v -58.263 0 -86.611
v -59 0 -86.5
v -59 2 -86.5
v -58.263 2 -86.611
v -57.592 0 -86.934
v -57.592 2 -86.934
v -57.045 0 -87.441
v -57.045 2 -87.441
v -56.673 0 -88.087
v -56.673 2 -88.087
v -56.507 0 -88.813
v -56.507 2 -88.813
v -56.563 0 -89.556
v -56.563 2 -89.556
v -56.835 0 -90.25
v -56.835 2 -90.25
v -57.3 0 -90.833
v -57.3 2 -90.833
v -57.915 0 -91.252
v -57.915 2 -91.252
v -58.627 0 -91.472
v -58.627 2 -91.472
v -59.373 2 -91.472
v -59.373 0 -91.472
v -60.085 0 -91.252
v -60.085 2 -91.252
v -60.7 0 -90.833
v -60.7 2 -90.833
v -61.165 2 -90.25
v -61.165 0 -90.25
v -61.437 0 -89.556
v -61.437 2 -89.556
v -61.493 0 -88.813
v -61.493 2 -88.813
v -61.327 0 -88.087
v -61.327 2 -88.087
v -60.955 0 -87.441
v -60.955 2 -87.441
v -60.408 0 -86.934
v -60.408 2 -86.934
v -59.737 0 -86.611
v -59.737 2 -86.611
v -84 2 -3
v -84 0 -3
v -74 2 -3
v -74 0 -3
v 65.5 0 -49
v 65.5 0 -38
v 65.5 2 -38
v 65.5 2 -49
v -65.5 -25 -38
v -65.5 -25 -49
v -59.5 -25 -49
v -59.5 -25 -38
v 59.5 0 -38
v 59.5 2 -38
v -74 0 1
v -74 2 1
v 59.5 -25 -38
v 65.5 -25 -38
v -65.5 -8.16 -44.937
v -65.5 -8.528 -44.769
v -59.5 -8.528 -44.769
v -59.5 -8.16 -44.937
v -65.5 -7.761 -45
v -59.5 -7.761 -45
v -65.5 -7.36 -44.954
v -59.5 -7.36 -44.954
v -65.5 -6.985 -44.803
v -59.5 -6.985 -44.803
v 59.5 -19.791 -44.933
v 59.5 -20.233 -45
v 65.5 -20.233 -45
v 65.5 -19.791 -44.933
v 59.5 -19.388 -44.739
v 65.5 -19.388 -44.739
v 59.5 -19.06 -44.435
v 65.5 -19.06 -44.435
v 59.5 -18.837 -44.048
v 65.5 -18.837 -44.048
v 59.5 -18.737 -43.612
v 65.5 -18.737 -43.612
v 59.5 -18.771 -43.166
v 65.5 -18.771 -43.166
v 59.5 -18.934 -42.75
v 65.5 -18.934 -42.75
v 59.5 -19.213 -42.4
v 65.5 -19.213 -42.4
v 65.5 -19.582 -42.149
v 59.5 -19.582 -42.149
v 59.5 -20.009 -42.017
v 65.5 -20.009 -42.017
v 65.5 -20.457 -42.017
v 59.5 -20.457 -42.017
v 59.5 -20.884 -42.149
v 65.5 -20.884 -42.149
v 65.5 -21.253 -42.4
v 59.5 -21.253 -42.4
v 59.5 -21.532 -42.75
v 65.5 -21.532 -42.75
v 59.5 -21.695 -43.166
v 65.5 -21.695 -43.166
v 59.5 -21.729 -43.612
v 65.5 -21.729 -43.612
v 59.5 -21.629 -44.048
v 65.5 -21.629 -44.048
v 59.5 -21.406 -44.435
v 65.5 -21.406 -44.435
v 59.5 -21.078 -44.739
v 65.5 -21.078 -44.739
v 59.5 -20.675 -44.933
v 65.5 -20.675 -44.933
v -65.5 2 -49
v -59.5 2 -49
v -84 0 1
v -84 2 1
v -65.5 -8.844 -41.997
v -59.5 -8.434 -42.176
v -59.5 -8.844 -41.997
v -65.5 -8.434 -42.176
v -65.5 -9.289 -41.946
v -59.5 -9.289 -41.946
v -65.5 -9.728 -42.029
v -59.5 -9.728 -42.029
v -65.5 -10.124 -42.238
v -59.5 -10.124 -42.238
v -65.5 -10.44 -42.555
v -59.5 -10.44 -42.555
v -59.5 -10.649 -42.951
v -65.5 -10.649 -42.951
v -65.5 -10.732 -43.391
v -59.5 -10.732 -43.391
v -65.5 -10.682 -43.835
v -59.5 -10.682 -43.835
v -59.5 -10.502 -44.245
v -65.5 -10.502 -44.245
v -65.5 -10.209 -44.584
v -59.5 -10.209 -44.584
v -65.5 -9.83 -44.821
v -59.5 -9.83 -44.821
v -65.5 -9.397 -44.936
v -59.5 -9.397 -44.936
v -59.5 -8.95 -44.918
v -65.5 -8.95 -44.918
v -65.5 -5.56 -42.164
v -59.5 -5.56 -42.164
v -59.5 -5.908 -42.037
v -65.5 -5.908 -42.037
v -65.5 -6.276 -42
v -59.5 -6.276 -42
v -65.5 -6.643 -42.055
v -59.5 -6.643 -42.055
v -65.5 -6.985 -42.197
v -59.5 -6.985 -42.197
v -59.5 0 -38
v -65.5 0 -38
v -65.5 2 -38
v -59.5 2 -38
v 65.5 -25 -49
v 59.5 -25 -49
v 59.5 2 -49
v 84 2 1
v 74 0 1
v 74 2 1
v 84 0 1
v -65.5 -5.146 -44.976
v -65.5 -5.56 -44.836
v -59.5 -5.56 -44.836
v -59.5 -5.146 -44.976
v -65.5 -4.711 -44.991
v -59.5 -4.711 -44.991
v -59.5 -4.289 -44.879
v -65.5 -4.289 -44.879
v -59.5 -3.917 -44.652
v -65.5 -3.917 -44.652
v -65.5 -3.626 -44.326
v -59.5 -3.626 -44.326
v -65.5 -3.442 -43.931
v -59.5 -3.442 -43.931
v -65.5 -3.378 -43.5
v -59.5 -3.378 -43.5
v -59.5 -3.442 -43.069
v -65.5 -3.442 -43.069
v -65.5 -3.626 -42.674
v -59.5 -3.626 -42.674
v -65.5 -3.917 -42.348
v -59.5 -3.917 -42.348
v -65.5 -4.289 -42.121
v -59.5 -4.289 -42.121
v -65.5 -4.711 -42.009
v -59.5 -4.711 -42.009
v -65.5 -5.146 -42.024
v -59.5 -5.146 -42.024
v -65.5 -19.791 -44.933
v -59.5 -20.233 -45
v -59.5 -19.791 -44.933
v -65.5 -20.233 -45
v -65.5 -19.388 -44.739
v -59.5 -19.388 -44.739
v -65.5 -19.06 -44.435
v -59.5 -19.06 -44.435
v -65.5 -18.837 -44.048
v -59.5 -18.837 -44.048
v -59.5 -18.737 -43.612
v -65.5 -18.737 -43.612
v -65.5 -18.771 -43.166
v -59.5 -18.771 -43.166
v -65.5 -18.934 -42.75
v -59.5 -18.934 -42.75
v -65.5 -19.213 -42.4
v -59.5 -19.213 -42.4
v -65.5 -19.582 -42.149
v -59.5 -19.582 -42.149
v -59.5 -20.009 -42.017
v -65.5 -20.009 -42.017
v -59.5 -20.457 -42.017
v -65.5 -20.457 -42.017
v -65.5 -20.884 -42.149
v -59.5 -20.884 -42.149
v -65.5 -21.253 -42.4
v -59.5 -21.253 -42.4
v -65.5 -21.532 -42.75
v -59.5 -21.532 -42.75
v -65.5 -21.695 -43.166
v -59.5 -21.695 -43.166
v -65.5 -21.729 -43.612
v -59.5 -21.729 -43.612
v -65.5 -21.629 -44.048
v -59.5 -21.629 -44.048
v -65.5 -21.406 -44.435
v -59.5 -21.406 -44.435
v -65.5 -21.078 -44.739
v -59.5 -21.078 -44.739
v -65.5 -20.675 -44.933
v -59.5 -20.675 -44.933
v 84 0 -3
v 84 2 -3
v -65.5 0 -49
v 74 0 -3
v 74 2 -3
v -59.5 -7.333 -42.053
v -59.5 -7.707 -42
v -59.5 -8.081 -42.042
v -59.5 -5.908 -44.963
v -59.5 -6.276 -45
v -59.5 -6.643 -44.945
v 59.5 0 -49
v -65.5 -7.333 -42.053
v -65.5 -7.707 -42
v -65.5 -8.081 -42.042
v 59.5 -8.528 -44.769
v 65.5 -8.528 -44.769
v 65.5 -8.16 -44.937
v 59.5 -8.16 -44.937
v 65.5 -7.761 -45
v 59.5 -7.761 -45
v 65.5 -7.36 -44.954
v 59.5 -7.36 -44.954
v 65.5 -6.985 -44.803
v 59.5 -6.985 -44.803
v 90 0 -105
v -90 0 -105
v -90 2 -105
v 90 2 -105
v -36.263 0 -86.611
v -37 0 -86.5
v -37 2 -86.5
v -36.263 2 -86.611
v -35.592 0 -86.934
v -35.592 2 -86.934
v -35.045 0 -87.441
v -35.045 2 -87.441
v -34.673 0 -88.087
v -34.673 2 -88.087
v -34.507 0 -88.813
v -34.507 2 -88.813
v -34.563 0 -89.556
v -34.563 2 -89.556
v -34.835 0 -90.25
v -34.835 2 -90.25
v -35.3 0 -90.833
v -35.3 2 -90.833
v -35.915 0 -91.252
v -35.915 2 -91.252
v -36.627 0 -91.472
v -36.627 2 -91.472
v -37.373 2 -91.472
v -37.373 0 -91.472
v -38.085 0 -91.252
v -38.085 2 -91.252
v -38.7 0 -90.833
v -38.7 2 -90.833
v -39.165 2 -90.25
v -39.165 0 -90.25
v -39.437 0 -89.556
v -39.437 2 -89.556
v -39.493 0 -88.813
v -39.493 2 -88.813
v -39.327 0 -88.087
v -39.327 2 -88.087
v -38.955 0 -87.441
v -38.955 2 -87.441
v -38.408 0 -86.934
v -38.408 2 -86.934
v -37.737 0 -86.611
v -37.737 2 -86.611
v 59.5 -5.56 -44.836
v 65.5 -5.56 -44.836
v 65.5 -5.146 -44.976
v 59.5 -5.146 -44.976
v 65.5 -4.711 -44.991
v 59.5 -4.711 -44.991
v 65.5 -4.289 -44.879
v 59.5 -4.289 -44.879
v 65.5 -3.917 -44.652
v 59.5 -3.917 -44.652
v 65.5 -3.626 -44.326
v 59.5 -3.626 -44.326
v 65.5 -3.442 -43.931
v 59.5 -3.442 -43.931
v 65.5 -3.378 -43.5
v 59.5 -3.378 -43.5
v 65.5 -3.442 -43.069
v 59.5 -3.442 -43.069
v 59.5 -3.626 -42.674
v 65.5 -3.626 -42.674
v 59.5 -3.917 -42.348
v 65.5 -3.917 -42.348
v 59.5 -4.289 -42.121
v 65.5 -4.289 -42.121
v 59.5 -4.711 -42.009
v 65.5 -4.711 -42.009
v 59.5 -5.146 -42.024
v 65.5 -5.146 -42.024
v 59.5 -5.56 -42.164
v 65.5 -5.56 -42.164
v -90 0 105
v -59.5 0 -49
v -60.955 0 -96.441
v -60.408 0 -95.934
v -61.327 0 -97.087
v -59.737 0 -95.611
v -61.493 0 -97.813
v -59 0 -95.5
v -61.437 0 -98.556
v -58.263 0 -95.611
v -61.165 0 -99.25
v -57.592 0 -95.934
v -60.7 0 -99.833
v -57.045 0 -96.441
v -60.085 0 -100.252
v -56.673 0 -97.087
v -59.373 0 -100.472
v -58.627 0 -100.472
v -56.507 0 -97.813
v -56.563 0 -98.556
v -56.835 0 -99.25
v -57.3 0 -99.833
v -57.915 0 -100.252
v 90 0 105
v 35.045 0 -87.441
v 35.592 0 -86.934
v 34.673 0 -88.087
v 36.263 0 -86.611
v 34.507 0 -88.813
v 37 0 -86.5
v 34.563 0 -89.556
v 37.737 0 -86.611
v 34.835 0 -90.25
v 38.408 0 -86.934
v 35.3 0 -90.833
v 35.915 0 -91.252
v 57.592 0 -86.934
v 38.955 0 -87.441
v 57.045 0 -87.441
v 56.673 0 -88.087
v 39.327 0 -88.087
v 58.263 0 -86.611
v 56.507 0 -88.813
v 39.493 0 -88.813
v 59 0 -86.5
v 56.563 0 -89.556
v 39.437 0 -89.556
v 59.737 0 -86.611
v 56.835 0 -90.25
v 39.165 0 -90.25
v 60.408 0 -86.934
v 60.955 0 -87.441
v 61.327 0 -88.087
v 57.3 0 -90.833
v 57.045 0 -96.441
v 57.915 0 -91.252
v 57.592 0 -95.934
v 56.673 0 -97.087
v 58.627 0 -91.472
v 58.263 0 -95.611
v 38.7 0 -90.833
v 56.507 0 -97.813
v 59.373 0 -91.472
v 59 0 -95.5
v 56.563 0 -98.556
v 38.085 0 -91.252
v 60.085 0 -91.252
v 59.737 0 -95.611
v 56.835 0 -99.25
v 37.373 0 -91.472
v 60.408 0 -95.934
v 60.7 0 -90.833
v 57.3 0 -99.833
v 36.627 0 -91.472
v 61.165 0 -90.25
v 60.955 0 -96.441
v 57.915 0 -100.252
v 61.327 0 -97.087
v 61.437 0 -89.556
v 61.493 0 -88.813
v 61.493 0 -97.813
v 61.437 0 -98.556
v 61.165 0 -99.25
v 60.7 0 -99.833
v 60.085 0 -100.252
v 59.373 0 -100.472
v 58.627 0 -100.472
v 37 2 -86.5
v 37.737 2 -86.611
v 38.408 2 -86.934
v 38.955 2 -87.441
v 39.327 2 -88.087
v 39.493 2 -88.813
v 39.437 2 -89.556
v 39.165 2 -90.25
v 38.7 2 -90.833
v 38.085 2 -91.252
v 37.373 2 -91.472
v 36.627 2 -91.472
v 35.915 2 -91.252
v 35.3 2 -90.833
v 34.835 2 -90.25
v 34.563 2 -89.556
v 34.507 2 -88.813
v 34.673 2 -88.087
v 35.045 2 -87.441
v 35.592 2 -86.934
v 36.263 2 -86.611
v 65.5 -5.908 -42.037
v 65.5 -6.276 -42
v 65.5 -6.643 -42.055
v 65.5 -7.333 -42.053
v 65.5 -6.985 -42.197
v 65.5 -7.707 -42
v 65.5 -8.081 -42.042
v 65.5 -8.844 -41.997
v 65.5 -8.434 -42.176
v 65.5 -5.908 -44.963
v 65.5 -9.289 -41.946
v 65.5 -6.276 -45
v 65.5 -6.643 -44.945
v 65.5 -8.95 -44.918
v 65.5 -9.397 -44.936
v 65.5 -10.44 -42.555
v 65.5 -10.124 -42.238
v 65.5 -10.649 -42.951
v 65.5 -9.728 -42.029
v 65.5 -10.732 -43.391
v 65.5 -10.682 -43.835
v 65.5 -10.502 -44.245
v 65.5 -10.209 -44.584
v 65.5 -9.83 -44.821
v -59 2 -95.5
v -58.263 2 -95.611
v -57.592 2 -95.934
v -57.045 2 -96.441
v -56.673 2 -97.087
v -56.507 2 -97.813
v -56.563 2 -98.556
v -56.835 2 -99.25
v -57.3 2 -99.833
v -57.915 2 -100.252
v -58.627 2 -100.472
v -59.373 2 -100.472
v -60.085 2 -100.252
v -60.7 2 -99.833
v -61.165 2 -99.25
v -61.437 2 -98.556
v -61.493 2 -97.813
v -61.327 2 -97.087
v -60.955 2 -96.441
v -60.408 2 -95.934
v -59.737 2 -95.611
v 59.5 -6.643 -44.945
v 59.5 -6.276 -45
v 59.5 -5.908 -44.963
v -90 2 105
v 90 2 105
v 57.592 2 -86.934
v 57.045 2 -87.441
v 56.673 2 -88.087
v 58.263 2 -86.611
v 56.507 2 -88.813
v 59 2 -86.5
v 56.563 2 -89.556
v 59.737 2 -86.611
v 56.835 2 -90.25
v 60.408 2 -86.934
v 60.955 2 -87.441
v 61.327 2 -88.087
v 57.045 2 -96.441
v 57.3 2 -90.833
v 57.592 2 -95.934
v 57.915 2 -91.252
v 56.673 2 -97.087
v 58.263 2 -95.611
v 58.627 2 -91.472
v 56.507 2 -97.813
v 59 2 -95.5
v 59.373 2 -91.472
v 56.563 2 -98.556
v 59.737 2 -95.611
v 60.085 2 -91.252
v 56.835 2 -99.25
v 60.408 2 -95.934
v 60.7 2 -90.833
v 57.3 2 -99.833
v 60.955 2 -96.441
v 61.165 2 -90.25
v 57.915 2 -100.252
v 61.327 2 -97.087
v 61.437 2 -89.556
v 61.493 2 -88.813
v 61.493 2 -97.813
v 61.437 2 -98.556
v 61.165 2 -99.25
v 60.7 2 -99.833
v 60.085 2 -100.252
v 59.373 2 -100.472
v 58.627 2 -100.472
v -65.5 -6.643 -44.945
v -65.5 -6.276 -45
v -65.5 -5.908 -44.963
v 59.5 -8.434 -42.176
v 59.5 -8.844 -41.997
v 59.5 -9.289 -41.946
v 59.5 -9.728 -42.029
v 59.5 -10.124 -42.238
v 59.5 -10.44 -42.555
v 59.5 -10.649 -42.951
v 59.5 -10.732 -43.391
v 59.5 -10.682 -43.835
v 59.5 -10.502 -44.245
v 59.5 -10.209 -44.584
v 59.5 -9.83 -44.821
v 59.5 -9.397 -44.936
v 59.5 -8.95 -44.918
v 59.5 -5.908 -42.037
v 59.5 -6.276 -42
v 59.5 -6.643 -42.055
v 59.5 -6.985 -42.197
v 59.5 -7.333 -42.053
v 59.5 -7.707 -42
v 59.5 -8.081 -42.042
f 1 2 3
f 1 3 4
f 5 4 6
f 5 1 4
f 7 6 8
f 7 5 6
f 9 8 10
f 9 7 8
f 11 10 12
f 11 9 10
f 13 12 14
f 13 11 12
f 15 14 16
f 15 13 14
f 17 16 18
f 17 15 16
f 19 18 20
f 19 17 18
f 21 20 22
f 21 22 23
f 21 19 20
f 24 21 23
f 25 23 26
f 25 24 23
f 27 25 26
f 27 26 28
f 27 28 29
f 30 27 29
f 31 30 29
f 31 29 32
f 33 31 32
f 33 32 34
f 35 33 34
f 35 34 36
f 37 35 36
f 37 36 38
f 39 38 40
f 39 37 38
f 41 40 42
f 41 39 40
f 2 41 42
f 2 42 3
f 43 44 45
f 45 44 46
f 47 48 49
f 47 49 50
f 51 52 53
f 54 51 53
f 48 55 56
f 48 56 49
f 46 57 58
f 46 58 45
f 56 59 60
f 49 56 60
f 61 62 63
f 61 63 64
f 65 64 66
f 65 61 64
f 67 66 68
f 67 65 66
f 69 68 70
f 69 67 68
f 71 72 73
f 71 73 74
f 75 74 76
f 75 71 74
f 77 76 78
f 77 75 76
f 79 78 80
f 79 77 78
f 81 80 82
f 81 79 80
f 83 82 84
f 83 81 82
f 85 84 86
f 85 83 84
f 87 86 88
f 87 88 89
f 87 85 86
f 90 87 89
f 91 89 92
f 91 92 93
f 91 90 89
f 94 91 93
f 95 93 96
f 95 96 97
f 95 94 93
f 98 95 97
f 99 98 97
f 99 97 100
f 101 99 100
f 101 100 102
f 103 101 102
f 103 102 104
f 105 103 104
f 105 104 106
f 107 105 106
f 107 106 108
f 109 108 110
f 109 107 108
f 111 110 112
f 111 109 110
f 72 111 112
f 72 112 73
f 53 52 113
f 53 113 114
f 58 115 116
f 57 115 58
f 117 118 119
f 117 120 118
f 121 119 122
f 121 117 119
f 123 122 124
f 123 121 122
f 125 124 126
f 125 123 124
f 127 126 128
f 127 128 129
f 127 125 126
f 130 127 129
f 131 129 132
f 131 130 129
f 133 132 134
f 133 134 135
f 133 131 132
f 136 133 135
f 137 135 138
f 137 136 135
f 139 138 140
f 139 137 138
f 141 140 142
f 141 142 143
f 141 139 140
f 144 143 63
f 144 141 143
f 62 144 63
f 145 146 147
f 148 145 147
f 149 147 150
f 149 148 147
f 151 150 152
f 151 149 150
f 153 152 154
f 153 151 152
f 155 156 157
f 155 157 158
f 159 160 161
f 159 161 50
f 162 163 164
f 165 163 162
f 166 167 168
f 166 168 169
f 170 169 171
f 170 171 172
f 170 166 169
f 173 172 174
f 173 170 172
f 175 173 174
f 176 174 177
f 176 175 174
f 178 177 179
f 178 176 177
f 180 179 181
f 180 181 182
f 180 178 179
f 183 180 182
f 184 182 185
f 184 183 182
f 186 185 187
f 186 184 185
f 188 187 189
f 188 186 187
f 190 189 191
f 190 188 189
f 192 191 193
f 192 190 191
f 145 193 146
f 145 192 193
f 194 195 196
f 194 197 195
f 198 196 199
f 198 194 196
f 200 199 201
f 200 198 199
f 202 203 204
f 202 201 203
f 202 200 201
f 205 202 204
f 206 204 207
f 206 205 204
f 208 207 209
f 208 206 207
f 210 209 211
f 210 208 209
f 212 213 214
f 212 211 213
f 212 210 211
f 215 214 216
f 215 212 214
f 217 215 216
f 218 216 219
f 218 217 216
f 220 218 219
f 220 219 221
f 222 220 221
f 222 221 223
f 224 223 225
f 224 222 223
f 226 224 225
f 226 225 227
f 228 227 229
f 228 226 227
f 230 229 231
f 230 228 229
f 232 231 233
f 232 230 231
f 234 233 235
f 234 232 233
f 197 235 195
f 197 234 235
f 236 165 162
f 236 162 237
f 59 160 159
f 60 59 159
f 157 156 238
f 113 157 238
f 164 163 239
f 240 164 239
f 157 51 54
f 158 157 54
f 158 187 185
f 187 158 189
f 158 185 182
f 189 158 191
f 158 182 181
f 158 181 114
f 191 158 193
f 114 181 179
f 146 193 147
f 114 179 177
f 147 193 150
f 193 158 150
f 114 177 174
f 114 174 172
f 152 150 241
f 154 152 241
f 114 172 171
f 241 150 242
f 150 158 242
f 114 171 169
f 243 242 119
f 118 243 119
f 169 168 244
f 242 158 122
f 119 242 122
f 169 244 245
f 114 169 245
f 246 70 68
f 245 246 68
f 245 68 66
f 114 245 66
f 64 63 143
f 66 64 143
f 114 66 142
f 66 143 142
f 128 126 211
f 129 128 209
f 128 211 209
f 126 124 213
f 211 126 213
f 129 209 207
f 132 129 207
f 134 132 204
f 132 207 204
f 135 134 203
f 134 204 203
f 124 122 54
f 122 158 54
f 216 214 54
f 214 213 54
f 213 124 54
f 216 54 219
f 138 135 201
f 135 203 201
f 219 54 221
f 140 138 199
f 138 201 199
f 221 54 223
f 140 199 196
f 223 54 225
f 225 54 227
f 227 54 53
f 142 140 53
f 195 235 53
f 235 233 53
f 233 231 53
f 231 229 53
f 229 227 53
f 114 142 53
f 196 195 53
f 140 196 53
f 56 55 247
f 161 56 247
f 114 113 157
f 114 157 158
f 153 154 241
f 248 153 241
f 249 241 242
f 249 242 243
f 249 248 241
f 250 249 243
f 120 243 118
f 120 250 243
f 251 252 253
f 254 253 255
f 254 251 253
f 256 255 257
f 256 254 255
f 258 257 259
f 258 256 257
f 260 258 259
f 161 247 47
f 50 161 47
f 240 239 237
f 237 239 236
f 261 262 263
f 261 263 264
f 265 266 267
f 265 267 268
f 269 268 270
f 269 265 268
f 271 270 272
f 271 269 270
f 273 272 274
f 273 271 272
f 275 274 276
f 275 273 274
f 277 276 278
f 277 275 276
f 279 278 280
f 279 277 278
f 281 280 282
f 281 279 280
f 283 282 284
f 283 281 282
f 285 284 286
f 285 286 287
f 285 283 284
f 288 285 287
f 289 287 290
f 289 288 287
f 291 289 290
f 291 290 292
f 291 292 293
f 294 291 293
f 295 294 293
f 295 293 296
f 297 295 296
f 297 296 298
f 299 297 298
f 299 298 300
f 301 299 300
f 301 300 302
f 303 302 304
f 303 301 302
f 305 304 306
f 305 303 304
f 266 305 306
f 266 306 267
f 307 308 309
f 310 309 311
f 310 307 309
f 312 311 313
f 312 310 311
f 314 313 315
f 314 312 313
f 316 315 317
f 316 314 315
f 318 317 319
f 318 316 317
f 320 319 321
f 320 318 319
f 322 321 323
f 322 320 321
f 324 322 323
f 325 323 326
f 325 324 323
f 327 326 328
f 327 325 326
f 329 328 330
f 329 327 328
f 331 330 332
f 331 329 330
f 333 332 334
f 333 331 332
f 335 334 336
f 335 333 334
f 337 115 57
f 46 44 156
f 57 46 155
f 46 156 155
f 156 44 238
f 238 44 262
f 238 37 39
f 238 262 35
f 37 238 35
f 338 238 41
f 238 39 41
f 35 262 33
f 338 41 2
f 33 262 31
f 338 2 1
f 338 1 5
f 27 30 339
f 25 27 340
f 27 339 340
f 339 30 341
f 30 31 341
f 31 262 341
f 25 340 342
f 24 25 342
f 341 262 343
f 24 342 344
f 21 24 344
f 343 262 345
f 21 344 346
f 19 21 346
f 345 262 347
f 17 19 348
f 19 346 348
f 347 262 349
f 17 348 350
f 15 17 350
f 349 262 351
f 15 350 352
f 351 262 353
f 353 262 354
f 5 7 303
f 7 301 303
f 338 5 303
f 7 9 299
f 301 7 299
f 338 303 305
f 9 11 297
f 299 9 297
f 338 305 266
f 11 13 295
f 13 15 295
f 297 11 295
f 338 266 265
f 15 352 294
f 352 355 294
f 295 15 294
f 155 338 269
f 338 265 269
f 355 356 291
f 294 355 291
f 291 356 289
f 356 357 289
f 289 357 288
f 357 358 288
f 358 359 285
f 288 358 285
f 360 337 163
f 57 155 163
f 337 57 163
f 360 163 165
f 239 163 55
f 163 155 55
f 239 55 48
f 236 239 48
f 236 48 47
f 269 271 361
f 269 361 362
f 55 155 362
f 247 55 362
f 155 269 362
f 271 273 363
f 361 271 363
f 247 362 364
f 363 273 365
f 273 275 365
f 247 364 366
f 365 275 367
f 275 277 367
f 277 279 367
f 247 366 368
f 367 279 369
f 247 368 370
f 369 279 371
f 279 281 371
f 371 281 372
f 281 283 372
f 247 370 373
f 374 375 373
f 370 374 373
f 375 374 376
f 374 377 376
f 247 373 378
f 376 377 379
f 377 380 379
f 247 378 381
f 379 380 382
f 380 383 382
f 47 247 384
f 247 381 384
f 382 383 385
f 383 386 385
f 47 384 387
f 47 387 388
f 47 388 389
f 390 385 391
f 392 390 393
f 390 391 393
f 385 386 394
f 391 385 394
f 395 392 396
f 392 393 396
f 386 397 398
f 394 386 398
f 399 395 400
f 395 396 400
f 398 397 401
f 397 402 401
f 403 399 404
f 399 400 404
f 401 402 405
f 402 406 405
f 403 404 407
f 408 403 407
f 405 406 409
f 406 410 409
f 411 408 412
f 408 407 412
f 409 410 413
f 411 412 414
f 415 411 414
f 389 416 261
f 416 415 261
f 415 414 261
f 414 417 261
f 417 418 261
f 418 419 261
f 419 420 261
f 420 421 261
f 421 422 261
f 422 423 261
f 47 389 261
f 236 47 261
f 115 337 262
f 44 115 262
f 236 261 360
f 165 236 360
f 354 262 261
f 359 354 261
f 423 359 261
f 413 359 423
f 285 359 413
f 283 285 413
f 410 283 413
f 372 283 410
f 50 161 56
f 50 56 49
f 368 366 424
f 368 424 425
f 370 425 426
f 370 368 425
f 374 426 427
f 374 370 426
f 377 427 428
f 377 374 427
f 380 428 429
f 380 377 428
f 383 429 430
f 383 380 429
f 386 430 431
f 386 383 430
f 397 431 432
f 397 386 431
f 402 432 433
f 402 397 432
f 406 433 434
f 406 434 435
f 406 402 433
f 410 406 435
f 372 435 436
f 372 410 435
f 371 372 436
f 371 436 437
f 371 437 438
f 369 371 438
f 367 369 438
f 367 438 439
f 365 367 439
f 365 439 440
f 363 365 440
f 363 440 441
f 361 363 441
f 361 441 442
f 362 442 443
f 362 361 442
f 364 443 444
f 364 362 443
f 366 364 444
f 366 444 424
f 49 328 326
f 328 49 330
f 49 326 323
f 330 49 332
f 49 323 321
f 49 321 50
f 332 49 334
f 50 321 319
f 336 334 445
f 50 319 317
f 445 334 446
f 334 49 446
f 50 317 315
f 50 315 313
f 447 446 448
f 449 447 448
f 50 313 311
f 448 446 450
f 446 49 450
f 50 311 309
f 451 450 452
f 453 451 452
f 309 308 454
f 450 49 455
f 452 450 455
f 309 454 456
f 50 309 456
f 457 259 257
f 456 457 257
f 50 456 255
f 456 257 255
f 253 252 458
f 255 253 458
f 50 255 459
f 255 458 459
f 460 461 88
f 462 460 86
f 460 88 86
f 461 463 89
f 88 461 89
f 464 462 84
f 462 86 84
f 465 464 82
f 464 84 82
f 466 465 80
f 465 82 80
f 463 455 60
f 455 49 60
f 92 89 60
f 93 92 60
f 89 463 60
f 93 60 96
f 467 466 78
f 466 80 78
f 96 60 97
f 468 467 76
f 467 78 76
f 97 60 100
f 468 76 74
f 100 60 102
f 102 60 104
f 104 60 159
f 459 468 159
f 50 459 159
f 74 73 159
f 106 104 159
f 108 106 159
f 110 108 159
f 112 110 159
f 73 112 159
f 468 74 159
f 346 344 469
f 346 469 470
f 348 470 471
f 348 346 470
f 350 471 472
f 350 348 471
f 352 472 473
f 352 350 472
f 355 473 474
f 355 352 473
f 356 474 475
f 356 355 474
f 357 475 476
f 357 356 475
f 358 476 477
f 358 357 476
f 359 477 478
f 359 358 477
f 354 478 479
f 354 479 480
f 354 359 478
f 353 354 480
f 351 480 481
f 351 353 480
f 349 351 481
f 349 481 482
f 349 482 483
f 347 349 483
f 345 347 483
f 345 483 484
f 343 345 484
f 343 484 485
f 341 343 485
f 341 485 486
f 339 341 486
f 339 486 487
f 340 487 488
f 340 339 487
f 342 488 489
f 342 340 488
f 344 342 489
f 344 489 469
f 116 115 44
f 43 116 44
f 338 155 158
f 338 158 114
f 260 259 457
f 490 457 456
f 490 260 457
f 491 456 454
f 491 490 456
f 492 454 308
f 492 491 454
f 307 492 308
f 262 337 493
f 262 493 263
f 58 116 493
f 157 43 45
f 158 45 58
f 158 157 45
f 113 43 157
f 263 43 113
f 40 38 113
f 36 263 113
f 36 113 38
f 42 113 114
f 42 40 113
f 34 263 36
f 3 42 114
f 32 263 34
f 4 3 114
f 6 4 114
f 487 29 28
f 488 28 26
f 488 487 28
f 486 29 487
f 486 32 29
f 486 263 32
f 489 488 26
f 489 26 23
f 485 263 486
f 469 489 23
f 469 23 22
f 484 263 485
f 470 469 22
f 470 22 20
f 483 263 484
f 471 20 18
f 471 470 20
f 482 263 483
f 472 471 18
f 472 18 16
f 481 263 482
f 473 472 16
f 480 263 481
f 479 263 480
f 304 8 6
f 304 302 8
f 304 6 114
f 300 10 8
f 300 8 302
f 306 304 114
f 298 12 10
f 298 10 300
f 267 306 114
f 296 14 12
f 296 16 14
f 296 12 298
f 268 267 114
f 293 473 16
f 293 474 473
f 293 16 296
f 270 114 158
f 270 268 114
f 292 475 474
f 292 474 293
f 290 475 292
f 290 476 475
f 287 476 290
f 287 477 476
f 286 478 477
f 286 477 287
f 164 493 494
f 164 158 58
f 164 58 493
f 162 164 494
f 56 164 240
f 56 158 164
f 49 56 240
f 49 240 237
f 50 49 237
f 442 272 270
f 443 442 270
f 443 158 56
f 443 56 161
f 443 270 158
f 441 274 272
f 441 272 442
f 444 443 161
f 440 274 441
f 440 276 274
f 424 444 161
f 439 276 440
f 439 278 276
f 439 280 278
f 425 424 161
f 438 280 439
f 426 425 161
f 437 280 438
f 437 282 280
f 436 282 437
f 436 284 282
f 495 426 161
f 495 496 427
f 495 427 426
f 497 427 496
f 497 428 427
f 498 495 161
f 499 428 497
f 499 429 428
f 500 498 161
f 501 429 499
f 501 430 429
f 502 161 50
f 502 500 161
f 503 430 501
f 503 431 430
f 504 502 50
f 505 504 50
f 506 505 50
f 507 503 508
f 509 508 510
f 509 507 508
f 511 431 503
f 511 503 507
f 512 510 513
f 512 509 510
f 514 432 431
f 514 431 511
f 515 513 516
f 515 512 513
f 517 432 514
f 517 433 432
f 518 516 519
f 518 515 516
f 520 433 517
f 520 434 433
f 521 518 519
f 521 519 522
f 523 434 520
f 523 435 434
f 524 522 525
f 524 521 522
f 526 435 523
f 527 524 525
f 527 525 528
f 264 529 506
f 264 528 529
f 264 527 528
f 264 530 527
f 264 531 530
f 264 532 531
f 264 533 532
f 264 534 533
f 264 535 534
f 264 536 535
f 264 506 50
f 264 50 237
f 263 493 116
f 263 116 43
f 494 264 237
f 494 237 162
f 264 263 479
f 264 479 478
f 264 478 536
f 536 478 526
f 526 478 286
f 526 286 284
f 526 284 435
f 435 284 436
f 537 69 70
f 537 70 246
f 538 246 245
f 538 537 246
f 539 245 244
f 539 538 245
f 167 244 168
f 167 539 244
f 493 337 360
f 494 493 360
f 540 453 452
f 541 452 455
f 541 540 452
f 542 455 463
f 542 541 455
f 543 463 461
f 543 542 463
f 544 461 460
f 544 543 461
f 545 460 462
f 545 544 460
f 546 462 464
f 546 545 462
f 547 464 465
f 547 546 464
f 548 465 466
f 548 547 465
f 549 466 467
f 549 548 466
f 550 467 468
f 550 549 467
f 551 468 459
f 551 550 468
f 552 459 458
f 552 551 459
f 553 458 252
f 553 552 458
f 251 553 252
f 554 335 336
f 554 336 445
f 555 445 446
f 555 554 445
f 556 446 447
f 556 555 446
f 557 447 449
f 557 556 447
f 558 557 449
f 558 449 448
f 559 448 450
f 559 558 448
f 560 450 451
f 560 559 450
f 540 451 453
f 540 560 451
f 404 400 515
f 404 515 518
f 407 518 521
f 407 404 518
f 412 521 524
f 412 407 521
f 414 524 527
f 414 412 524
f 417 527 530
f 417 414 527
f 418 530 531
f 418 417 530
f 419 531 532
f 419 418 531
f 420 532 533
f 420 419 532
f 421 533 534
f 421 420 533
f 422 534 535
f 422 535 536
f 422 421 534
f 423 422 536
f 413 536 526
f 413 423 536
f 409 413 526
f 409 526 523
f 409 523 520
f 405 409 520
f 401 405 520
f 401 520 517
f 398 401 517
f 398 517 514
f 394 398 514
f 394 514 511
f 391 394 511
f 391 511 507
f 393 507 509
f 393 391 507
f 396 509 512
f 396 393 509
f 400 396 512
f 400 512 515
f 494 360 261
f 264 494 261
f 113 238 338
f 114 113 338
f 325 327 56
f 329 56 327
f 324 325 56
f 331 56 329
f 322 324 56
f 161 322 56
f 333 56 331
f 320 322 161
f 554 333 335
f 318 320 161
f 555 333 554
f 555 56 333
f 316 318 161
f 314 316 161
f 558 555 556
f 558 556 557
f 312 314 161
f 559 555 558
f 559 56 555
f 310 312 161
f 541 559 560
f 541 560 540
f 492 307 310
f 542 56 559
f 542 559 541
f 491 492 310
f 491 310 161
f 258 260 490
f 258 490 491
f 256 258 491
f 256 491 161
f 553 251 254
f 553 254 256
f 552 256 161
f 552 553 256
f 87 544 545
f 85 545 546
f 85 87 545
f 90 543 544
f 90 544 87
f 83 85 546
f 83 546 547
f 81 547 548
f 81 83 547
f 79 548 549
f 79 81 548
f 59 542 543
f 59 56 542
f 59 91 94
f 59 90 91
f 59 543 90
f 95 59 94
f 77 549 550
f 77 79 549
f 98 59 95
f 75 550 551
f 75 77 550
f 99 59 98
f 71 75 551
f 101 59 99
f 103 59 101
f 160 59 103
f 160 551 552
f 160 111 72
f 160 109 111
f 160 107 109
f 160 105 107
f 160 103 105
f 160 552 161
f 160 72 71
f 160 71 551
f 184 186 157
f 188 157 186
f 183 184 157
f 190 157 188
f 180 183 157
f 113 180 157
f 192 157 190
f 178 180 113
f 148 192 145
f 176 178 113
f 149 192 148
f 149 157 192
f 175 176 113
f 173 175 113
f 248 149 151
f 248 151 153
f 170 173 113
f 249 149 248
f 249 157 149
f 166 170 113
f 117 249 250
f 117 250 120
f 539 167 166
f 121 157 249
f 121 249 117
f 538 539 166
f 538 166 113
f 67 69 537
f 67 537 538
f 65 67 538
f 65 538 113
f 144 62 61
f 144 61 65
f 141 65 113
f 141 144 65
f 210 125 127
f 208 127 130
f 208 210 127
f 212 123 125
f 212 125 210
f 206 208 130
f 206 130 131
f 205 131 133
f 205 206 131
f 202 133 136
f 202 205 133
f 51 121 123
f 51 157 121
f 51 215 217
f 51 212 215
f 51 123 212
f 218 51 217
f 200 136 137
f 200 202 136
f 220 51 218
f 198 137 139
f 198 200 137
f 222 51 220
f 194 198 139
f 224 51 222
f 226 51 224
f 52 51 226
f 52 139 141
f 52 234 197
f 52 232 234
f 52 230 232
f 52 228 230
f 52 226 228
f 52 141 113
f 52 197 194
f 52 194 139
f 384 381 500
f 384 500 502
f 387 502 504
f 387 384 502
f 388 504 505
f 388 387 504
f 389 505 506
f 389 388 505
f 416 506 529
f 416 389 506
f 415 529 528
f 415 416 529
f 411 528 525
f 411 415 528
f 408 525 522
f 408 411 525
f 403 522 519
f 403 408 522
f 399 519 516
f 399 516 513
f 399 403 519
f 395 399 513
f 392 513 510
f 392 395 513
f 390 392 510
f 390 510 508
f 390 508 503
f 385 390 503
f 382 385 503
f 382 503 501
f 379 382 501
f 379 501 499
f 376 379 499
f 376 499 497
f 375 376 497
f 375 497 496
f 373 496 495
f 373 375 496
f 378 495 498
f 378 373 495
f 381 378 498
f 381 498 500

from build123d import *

# Parameters (mm, degrees)
SKETCH1_W              = 180
SKETCH1_H              = 210
SKETCH1_R              = 2.5
SKETCH1_W_2            = 10
SKETCH1_H_2            = 4
SKETCH1_W_3            = 6
SKETCH1_H_3            = 11
MAINBODY_DEPTH         = 2
SAYAPRODA_DEPTH        = 2
SAYAPRODA_DEPTH_BACK   = 25
SKETCH1_4_W            = 6
SKETCH1_4_H            = 11
SAYAPRODA_2_DEPTH      = 2
SAYAPRODA_2_DEPTH_BACK = 25
SKETCH9_W              = 1.5
SKETCH9_H              = 155.5
HOLE1_AT_2_COUNT       = 2
HOLE1_AT_2_PITCH       = 11
HOLE1_AT_3_COUNT       = 2
HOLE1_AT_3_PITCH       = 12.504350098
HOLE1_AT_4_COUNT       = 2
HOLE1_AT_4_PITCH       = 13.992231398
HOLE1_AT_5_COUNT       = 2
HOLE1_AT_5_PITCH       = 15.354775431


with BuildPart() as part:
    # Sketch1 → MainBody (new body)
    with BuildSketch(Plane(origin=(0, 0, 0), x_dir=(1, 0, 0), z_dir=(0, 1, 0))):
        Rectangle(SKETCH1_W, SKETCH1_H)
        with Locations((-59, 98)):
            Circle(SKETCH1_R, mode=Mode.SUBTRACT)
        with Locations((-59, 89)):
            Circle(SKETCH1_R, mode=Mode.SUBTRACT)
        with Locations((-37, 89)):
            Circle(SKETCH1_R, mode=Mode.SUBTRACT)
        with Locations((59, 98)):
            Circle(SKETCH1_R, mode=Mode.SUBTRACT)
        with Locations((59, 89)):
            Circle(SKETCH1_R, mode=Mode.SUBTRACT)
        with Locations((37, 89)):
            Circle(SKETCH1_R, mode=Mode.SUBTRACT)
        with Locations((79, 1)):
            Rectangle(SKETCH1_W_2, SKETCH1_H_2, mode=Mode.SUBTRACT)
        with Locations((-79, 1)):
            Rectangle(SKETCH1_W_2, SKETCH1_H_2, mode=Mode.SUBTRACT)
        with Locations((-62.5, 43.5)):
            Rectangle(SKETCH1_W_3, SKETCH1_H_3, mode=Mode.SUBTRACT)
        with Locations((62.5, 43.5)):
            Rectangle(SKETCH1_W_3, SKETCH1_H_3, mode=Mode.SUBTRACT)
    extrude(amount=MAINBODY_DEPTH)


with BuildPart() as body_2:
    # Sketch1<4> → SayapRoda (new, two sides: drawn at the far end of the back side and taken through both)
    with BuildSketch(Plane(origin=(0, 0, 0), x_dir=(1, 0, 0), z_dir=(0, 1, 0)).offset(-SAYAPRODA_DEPTH_BACK)):
        with Locations((-62.5, 43.5)):
            Rectangle(SKETCH1_4_W, SKETCH1_4_H)
    extrude(amount=SAYAPRODA_DEPTH + SAYAPRODA_DEPTH_BACK)


with BuildPart() as body_3:
    # Sketch1<4> → SayapRoda 2 (new, two sides: drawn at the far end of the back side and taken through both)
    with BuildSketch(Plane(origin=(0, 0, 0), x_dir=(1, 0, 0), z_dir=(0, 1, 0)).offset(-SAYAPRODA_2_DEPTH_BACK)):
        with Locations((62.5, 43.5)):
            Rectangle(SKETCH1_4_W, SKETCH1_4_H)
    extrude(amount=SAYAPRODA_2_DEPTH + SAYAPRODA_2_DEPTH_BACK)


with BuildPart() as hole1_tool:
    # Sketch9 → Hole1 (revolve)
    with BuildSketch(Plane(origin=(65.5, -20.233052412, -43.5), x_dir=(0, 0, -1), z_dir=(0, 1, 0))):
        with Locations((0.75, 77.75)):
            Rectangle(SKETCH9_W, SKETCH9_H)
    hole1 = revolve(axis=Axis((-44.5, -20.233052412, -43.5), (1, 0, 0)))


with BuildPart() as body_2_1:
    add(body_2.part)

    # Hole1: cut by hole1_tool
    add(hole1_tool.part, mode=Mode.SUBTRACT)


with BuildPart() as body_3_1:
    add(body_3.part)

    # Hole1: cut by hole1_tool
    add(hole1_tool.part, mode=Mode.SUBTRACT)


with BuildPart() as hole1_at_2_tool:
    # Hole1 at 2: Hole1 ×2
    with Locations(*[Vector(0, 0.9999876242984519, 0.004975062807454704) * (i * HOLE1_AT_2_PITCH) for i in range(1, HOLE1_AT_2_COUNT)]):
        add(hole1)


with BuildPart() as body_2_2:
    add(body_2_1.part)

    # Hole1 at 2: cut by hole1_at_2_tool
    add(hole1_at_2_tool.part, mode=Mode.SUBTRACT)


with BuildPart() as body_3_2:
    add(body_3_1.part)

    # Hole1 at 2: cut by hole1_at_2_tool
    add(hole1_at_2_tool.part, mode=Mode.SUBTRACT)


with BuildPart() as hole1_at_3_tool:
    # Hole1 at 3: Hole1 ×2
    with Locations(*[(0, i * HOLE1_AT_3_PITCH, 0) for i in range(1, HOLE1_AT_3_COUNT)]):
        add(hole1)


with BuildPart() as body_2_3:
    add(body_2_2.part)

    # Hole1 at 3: cut by hole1_at_3_tool
    add(hole1_at_3_tool.part, mode=Mode.SUBTRACT)


with BuildPart() as body_3_3:
    add(body_3_2.part)

    # Hole1 at 3: cut by hole1_at_3_tool
    add(hole1_at_3_tool.part, mode=Mode.SUBTRACT)


with BuildPart() as hole1_at_4_tool:
    # Hole1 at 4: Hole1 ×2
    with Locations(*[(0, i * HOLE1_AT_4_PITCH, 0) for i in range(1, HOLE1_AT_4_COUNT)]):
        add(hole1)


with BuildPart() as body_2_4:
    add(body_2_3.part)

    # Hole1 at 4: cut by hole1_at_4_tool
    add(hole1_at_4_tool.part, mode=Mode.SUBTRACT)


with BuildPart() as body_3_4:
    add(body_3_3.part)

    # Hole1 at 4: cut by hole1_at_4_tool
    add(hole1_at_4_tool.part, mode=Mode.SUBTRACT)


with BuildPart() as hole1_at_5_tool:
    # Hole1 at 5: Hole1 ×2
    with Locations(*[(0, i * HOLE1_AT_5_PITCH, 0) for i in range(1, HOLE1_AT_5_COUNT)]):
        add(hole1)


with BuildPart() as body_2_5:
    add(body_2_4.part)

    # Hole1 at 5: cut by hole1_at_5_tool
    add(hole1_at_5_tool.part, mode=Mode.SUBTRACT)


with BuildPart() as body_3_5:
    add(body_3_4.part)

    # Hole1 at 5: cut by hole1_at_5_tool
    add(hole1_at_5_tool.part, mode=Mode.SUBTRACT)


solid = Compound([part.part, body_2_5.part, body_3_5.part])
